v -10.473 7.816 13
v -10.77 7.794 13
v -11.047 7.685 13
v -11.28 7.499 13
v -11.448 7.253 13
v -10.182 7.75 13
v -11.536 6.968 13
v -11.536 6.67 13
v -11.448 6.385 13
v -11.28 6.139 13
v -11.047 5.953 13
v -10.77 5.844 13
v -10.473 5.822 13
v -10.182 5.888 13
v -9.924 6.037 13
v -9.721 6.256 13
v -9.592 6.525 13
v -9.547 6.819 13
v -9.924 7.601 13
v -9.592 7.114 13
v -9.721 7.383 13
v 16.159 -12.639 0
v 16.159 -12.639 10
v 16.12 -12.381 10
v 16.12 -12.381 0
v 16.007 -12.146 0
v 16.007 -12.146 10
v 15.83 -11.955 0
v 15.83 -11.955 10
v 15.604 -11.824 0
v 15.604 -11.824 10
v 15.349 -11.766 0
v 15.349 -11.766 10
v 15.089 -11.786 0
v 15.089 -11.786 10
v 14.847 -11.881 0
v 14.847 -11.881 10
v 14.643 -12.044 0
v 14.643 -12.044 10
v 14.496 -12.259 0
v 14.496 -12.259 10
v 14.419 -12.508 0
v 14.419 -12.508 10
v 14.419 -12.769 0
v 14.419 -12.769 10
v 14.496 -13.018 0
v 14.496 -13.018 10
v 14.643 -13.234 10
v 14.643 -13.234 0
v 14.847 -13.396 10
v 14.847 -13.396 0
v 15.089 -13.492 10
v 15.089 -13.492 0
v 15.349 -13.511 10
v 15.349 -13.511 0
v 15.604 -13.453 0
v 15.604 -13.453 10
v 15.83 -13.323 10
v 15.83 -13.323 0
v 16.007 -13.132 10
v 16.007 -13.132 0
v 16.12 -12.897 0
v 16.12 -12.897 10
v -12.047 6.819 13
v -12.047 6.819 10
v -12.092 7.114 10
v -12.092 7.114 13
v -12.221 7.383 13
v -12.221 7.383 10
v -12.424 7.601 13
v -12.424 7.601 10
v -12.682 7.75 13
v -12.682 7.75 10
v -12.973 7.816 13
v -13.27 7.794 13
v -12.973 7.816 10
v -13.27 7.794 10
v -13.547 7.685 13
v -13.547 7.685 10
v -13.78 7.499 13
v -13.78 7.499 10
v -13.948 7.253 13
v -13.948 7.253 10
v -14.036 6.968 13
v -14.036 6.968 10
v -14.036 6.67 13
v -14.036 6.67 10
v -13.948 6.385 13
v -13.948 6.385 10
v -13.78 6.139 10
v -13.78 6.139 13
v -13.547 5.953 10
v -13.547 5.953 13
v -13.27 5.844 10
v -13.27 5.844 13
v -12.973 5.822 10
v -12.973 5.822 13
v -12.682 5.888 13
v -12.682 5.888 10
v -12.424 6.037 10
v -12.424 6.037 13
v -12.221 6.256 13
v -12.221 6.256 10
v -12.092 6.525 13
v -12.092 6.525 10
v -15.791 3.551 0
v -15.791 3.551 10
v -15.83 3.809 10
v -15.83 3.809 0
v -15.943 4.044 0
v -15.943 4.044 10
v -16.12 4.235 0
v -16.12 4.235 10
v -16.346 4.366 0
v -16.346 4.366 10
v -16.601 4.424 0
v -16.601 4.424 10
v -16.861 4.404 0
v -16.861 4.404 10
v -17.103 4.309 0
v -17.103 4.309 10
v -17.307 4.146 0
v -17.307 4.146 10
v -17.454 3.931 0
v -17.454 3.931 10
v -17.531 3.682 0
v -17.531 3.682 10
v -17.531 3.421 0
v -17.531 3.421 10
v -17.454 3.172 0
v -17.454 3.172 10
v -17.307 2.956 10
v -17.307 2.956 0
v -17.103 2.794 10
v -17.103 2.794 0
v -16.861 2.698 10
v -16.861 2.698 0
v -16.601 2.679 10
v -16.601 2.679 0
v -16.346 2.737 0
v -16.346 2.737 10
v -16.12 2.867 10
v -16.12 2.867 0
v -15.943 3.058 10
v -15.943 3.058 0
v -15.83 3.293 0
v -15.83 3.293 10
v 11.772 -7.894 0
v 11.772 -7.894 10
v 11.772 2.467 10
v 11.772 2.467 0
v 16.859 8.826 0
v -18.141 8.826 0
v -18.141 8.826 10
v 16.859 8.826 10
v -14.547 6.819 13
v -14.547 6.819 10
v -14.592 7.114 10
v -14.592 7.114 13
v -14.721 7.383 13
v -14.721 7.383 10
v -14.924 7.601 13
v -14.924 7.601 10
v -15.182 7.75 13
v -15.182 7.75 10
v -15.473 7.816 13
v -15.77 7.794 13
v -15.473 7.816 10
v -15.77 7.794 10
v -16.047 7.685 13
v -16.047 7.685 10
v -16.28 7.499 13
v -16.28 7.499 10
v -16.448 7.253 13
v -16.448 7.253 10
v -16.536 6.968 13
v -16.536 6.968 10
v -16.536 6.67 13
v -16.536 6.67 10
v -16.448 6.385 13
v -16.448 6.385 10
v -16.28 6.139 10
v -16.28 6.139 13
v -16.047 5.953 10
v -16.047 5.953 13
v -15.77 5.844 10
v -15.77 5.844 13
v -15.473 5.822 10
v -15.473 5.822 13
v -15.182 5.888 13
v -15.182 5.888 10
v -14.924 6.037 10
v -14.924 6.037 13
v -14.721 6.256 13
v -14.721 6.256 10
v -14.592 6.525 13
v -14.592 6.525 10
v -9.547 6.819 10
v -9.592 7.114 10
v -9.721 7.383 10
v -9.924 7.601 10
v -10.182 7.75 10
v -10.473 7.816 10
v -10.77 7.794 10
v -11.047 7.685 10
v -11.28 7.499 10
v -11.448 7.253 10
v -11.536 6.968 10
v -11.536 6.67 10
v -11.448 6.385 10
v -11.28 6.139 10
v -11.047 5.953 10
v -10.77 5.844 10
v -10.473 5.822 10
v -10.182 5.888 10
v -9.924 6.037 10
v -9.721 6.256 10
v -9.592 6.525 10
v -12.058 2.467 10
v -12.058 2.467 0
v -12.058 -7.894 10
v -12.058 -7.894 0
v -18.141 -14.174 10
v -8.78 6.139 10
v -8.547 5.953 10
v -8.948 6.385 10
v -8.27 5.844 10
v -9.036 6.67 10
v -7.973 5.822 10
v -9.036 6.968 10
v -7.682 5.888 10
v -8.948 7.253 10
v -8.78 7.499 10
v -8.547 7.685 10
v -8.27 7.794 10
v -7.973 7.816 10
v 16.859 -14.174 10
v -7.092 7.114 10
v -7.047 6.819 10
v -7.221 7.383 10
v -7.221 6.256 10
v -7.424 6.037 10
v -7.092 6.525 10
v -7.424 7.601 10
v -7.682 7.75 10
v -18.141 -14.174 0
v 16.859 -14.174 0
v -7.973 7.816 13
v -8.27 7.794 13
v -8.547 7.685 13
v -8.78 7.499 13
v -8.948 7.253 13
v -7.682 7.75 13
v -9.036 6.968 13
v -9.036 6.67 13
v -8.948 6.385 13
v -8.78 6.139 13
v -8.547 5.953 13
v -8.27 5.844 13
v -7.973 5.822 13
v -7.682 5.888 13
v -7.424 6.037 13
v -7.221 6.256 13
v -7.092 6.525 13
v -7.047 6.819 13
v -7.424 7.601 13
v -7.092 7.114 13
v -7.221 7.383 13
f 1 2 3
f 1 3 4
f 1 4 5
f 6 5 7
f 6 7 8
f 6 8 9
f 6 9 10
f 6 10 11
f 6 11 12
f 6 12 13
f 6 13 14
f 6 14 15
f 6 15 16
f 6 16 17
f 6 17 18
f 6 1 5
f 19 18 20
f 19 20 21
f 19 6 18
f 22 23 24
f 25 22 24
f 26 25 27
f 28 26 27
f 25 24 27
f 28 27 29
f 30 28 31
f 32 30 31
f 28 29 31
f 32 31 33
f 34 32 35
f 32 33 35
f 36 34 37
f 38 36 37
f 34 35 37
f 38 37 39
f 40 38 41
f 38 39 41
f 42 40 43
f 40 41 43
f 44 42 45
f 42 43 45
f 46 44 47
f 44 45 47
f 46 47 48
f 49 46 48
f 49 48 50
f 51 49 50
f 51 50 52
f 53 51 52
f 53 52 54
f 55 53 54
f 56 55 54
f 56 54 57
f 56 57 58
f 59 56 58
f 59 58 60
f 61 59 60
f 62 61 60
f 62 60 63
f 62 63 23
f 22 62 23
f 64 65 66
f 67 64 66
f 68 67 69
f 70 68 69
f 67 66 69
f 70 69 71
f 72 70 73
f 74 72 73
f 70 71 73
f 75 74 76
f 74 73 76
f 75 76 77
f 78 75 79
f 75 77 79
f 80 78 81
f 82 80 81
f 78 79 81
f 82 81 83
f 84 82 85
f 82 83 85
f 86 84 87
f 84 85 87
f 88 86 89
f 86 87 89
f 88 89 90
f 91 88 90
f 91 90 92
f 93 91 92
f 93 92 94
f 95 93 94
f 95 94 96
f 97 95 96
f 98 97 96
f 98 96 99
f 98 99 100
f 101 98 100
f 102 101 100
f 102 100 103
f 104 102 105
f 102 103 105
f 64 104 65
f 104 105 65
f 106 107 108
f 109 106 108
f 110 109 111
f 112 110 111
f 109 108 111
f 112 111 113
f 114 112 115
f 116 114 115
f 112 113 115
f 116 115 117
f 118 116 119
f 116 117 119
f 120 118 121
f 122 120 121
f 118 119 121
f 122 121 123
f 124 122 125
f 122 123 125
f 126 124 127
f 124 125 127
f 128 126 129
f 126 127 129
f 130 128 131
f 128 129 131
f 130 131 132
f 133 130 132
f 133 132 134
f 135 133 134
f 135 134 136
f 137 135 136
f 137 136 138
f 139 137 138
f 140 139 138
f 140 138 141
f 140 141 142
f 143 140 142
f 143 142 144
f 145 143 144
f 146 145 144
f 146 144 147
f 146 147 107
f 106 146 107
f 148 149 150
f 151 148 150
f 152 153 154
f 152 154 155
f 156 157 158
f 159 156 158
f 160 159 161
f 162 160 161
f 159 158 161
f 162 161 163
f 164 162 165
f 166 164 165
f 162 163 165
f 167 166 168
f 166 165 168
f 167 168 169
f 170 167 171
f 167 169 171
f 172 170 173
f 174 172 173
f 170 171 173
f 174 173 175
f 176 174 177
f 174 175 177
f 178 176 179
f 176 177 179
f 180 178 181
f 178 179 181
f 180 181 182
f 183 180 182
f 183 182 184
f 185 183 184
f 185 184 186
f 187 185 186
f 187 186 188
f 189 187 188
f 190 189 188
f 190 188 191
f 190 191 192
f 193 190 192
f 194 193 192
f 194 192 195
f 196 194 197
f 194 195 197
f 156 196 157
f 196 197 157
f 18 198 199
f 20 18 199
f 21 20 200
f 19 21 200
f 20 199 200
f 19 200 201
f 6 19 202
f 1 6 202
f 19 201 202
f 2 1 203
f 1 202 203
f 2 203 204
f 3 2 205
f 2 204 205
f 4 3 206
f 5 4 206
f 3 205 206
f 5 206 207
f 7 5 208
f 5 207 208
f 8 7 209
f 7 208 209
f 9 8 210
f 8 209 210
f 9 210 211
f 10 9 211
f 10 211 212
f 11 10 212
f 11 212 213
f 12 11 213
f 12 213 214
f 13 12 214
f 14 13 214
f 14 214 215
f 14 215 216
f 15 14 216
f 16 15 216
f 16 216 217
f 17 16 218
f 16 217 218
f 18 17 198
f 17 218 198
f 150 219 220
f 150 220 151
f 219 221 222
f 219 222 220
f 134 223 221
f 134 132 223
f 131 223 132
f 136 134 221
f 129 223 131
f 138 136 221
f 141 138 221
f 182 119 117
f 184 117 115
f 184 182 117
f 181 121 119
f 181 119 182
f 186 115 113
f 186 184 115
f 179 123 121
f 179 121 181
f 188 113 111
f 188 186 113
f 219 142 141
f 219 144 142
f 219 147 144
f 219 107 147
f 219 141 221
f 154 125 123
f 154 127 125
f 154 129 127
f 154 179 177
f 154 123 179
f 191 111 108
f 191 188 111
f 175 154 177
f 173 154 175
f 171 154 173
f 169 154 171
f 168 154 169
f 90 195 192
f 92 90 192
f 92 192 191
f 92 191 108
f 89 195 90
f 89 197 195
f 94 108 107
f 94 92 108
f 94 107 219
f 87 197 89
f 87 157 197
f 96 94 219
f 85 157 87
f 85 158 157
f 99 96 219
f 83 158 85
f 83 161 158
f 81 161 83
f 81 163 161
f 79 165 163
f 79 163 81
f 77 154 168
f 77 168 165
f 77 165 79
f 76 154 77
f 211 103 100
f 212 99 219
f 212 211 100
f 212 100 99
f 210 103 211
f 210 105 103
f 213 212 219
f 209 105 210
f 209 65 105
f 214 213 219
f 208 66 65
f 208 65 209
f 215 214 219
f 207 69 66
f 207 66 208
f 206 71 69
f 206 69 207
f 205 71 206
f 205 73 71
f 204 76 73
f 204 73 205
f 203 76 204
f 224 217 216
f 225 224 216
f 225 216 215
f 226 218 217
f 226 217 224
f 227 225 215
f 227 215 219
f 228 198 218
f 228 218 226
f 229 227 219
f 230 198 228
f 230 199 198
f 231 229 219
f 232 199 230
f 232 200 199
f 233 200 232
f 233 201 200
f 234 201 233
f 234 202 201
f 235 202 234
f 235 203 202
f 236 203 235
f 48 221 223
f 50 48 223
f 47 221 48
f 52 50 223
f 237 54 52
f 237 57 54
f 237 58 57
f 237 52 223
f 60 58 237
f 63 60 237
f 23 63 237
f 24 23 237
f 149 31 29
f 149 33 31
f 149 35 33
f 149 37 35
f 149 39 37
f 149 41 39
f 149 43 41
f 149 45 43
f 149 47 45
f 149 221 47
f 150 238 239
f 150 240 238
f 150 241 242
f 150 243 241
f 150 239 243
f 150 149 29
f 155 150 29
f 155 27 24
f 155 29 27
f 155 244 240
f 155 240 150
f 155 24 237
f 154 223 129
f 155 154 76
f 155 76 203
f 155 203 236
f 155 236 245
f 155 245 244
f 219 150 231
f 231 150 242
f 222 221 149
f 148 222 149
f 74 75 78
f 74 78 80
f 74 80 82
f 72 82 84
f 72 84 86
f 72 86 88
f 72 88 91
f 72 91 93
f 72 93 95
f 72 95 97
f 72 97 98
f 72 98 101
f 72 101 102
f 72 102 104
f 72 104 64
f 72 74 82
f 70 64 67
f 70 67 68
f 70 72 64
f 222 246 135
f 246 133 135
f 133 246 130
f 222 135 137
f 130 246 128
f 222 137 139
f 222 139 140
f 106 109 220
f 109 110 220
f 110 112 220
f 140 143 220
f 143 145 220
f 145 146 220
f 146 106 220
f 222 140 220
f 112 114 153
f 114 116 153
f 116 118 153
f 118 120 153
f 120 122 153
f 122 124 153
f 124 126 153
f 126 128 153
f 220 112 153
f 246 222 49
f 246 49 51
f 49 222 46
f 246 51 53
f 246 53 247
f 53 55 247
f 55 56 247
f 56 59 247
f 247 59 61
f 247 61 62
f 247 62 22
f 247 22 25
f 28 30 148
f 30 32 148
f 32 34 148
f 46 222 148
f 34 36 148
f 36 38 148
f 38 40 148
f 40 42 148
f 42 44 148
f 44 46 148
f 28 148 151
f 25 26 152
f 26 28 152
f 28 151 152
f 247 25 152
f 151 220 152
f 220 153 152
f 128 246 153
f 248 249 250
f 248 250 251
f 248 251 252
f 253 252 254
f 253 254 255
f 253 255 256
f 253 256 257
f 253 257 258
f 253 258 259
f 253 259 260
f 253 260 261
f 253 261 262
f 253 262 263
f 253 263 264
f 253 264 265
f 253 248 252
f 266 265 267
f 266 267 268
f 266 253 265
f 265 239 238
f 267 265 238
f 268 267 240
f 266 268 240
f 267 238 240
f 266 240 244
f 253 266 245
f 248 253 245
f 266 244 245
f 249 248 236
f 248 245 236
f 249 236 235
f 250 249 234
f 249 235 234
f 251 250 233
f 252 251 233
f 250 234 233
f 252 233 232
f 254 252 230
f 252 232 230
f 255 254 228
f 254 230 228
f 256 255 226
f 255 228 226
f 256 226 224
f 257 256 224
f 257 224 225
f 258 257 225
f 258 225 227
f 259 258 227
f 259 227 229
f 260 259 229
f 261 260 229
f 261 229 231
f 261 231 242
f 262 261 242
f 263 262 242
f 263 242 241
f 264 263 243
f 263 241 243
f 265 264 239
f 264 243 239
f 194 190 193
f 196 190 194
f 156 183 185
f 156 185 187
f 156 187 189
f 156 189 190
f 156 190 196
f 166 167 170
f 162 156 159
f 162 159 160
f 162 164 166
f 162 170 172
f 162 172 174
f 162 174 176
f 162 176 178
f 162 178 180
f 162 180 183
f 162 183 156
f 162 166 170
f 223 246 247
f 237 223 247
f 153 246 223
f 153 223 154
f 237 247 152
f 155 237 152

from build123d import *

# Parameters (mm, degrees)
SKETCH_1_W          = 35
SKETCH_1_H          = 23
EXTRUDE_1_DEPTH     = 10
SKETCH_2_W          = 23.830576701
SKETCH_2_H          = 10.361120305
CUT_EXTRUDE_1_DEPTH = 10
CUT_EXTRUDE_2_REACH = 27.1
SKETCH_3_R          = 0.875
SKETCH_4_R          = 1
EXTRUDE_2_DEPTH     = 3


with BuildPart() as part:
    # 草圖1 → 填料-伸長1 (new body)
    with BuildSketch(Plane.XY):
        with Locations((-0.640978345, -2.673693694)):
            Rectangle(SKETCH_1_W, SKETCH_1_H)
    extrude(amount=EXTRUDE_1_DEPTH)

    # 草圖2 → 除料-伸長1 (cut)
    with BuildSketch(Plane.XY.offset(10)):
        with Locations((-0.14284756, -2.713544157)):
            Rectangle(SKETCH_2_W, SKETCH_2_H)
    extrude(amount=-CUT_EXTRUDE_1_DEPTH, mode=Mode.SUBTRACT)

    # 草圖3 → 除料-伸長2 (cut, up to next)
    with BuildSketch(Plane.XY.offset(10), mode=Mode.PRIVATE) as cut_extrude_2_sk1:
        with Locations((-16.665978345, 3.551306306)):
            Circle(SKETCH_3_R)
    cut_extrude_2_tool1 = extrude(cut_extrude_2_sk1.sketch, amount=-CUT_EXTRUDE_2_REACH, mode=Mode.PRIVATE) & part.part
    # 草圖3 → 除料-伸長2 (cut, up to next)
    with BuildSketch(Plane.XY.offset(10), mode=Mode.PRIVATE) as cut_extrude_2_sk2:
        with Locations((15.284021655, -12.638693694)):
            Circle(SKETCH_3_R)
    cut_extrude_2_tool2 = extrude(cut_extrude_2_sk2.sketch, amount=-CUT_EXTRUDE_2_REACH, mode=Mode.PRIVATE) & part.part
    add(cut_extrude_2_tool1.solids().sort_by_distance((-16.665978, 3.551306, 10))[0], mode=Mode.SUBTRACT)
    add(cut_extrude_2_tool2.solids().sort_by_distance((15.284022, -12.638694, 10))[0], mode=Mode.SUBTRACT)

    # 草圖4 → 填料-伸長2 (add)
    with BuildSketch(Plane.XY.offset(10)):
        with Locations((-15.547323348, 6.81929444)):
            Circle(SKETCH_4_R)
        with Locations((-13.047323348, 6.81929444)):
            Circle(SKETCH_4_R)
        with Locations((-10.547323348, 6.81929444)):
            Circle(SKETCH_4_R)
        with Locations((-8.047323348, 6.81929444)):
            Circle(SKETCH_4_R)
    extrude(amount=EXTRUDE_2_DEPTH)


solid = part.part
